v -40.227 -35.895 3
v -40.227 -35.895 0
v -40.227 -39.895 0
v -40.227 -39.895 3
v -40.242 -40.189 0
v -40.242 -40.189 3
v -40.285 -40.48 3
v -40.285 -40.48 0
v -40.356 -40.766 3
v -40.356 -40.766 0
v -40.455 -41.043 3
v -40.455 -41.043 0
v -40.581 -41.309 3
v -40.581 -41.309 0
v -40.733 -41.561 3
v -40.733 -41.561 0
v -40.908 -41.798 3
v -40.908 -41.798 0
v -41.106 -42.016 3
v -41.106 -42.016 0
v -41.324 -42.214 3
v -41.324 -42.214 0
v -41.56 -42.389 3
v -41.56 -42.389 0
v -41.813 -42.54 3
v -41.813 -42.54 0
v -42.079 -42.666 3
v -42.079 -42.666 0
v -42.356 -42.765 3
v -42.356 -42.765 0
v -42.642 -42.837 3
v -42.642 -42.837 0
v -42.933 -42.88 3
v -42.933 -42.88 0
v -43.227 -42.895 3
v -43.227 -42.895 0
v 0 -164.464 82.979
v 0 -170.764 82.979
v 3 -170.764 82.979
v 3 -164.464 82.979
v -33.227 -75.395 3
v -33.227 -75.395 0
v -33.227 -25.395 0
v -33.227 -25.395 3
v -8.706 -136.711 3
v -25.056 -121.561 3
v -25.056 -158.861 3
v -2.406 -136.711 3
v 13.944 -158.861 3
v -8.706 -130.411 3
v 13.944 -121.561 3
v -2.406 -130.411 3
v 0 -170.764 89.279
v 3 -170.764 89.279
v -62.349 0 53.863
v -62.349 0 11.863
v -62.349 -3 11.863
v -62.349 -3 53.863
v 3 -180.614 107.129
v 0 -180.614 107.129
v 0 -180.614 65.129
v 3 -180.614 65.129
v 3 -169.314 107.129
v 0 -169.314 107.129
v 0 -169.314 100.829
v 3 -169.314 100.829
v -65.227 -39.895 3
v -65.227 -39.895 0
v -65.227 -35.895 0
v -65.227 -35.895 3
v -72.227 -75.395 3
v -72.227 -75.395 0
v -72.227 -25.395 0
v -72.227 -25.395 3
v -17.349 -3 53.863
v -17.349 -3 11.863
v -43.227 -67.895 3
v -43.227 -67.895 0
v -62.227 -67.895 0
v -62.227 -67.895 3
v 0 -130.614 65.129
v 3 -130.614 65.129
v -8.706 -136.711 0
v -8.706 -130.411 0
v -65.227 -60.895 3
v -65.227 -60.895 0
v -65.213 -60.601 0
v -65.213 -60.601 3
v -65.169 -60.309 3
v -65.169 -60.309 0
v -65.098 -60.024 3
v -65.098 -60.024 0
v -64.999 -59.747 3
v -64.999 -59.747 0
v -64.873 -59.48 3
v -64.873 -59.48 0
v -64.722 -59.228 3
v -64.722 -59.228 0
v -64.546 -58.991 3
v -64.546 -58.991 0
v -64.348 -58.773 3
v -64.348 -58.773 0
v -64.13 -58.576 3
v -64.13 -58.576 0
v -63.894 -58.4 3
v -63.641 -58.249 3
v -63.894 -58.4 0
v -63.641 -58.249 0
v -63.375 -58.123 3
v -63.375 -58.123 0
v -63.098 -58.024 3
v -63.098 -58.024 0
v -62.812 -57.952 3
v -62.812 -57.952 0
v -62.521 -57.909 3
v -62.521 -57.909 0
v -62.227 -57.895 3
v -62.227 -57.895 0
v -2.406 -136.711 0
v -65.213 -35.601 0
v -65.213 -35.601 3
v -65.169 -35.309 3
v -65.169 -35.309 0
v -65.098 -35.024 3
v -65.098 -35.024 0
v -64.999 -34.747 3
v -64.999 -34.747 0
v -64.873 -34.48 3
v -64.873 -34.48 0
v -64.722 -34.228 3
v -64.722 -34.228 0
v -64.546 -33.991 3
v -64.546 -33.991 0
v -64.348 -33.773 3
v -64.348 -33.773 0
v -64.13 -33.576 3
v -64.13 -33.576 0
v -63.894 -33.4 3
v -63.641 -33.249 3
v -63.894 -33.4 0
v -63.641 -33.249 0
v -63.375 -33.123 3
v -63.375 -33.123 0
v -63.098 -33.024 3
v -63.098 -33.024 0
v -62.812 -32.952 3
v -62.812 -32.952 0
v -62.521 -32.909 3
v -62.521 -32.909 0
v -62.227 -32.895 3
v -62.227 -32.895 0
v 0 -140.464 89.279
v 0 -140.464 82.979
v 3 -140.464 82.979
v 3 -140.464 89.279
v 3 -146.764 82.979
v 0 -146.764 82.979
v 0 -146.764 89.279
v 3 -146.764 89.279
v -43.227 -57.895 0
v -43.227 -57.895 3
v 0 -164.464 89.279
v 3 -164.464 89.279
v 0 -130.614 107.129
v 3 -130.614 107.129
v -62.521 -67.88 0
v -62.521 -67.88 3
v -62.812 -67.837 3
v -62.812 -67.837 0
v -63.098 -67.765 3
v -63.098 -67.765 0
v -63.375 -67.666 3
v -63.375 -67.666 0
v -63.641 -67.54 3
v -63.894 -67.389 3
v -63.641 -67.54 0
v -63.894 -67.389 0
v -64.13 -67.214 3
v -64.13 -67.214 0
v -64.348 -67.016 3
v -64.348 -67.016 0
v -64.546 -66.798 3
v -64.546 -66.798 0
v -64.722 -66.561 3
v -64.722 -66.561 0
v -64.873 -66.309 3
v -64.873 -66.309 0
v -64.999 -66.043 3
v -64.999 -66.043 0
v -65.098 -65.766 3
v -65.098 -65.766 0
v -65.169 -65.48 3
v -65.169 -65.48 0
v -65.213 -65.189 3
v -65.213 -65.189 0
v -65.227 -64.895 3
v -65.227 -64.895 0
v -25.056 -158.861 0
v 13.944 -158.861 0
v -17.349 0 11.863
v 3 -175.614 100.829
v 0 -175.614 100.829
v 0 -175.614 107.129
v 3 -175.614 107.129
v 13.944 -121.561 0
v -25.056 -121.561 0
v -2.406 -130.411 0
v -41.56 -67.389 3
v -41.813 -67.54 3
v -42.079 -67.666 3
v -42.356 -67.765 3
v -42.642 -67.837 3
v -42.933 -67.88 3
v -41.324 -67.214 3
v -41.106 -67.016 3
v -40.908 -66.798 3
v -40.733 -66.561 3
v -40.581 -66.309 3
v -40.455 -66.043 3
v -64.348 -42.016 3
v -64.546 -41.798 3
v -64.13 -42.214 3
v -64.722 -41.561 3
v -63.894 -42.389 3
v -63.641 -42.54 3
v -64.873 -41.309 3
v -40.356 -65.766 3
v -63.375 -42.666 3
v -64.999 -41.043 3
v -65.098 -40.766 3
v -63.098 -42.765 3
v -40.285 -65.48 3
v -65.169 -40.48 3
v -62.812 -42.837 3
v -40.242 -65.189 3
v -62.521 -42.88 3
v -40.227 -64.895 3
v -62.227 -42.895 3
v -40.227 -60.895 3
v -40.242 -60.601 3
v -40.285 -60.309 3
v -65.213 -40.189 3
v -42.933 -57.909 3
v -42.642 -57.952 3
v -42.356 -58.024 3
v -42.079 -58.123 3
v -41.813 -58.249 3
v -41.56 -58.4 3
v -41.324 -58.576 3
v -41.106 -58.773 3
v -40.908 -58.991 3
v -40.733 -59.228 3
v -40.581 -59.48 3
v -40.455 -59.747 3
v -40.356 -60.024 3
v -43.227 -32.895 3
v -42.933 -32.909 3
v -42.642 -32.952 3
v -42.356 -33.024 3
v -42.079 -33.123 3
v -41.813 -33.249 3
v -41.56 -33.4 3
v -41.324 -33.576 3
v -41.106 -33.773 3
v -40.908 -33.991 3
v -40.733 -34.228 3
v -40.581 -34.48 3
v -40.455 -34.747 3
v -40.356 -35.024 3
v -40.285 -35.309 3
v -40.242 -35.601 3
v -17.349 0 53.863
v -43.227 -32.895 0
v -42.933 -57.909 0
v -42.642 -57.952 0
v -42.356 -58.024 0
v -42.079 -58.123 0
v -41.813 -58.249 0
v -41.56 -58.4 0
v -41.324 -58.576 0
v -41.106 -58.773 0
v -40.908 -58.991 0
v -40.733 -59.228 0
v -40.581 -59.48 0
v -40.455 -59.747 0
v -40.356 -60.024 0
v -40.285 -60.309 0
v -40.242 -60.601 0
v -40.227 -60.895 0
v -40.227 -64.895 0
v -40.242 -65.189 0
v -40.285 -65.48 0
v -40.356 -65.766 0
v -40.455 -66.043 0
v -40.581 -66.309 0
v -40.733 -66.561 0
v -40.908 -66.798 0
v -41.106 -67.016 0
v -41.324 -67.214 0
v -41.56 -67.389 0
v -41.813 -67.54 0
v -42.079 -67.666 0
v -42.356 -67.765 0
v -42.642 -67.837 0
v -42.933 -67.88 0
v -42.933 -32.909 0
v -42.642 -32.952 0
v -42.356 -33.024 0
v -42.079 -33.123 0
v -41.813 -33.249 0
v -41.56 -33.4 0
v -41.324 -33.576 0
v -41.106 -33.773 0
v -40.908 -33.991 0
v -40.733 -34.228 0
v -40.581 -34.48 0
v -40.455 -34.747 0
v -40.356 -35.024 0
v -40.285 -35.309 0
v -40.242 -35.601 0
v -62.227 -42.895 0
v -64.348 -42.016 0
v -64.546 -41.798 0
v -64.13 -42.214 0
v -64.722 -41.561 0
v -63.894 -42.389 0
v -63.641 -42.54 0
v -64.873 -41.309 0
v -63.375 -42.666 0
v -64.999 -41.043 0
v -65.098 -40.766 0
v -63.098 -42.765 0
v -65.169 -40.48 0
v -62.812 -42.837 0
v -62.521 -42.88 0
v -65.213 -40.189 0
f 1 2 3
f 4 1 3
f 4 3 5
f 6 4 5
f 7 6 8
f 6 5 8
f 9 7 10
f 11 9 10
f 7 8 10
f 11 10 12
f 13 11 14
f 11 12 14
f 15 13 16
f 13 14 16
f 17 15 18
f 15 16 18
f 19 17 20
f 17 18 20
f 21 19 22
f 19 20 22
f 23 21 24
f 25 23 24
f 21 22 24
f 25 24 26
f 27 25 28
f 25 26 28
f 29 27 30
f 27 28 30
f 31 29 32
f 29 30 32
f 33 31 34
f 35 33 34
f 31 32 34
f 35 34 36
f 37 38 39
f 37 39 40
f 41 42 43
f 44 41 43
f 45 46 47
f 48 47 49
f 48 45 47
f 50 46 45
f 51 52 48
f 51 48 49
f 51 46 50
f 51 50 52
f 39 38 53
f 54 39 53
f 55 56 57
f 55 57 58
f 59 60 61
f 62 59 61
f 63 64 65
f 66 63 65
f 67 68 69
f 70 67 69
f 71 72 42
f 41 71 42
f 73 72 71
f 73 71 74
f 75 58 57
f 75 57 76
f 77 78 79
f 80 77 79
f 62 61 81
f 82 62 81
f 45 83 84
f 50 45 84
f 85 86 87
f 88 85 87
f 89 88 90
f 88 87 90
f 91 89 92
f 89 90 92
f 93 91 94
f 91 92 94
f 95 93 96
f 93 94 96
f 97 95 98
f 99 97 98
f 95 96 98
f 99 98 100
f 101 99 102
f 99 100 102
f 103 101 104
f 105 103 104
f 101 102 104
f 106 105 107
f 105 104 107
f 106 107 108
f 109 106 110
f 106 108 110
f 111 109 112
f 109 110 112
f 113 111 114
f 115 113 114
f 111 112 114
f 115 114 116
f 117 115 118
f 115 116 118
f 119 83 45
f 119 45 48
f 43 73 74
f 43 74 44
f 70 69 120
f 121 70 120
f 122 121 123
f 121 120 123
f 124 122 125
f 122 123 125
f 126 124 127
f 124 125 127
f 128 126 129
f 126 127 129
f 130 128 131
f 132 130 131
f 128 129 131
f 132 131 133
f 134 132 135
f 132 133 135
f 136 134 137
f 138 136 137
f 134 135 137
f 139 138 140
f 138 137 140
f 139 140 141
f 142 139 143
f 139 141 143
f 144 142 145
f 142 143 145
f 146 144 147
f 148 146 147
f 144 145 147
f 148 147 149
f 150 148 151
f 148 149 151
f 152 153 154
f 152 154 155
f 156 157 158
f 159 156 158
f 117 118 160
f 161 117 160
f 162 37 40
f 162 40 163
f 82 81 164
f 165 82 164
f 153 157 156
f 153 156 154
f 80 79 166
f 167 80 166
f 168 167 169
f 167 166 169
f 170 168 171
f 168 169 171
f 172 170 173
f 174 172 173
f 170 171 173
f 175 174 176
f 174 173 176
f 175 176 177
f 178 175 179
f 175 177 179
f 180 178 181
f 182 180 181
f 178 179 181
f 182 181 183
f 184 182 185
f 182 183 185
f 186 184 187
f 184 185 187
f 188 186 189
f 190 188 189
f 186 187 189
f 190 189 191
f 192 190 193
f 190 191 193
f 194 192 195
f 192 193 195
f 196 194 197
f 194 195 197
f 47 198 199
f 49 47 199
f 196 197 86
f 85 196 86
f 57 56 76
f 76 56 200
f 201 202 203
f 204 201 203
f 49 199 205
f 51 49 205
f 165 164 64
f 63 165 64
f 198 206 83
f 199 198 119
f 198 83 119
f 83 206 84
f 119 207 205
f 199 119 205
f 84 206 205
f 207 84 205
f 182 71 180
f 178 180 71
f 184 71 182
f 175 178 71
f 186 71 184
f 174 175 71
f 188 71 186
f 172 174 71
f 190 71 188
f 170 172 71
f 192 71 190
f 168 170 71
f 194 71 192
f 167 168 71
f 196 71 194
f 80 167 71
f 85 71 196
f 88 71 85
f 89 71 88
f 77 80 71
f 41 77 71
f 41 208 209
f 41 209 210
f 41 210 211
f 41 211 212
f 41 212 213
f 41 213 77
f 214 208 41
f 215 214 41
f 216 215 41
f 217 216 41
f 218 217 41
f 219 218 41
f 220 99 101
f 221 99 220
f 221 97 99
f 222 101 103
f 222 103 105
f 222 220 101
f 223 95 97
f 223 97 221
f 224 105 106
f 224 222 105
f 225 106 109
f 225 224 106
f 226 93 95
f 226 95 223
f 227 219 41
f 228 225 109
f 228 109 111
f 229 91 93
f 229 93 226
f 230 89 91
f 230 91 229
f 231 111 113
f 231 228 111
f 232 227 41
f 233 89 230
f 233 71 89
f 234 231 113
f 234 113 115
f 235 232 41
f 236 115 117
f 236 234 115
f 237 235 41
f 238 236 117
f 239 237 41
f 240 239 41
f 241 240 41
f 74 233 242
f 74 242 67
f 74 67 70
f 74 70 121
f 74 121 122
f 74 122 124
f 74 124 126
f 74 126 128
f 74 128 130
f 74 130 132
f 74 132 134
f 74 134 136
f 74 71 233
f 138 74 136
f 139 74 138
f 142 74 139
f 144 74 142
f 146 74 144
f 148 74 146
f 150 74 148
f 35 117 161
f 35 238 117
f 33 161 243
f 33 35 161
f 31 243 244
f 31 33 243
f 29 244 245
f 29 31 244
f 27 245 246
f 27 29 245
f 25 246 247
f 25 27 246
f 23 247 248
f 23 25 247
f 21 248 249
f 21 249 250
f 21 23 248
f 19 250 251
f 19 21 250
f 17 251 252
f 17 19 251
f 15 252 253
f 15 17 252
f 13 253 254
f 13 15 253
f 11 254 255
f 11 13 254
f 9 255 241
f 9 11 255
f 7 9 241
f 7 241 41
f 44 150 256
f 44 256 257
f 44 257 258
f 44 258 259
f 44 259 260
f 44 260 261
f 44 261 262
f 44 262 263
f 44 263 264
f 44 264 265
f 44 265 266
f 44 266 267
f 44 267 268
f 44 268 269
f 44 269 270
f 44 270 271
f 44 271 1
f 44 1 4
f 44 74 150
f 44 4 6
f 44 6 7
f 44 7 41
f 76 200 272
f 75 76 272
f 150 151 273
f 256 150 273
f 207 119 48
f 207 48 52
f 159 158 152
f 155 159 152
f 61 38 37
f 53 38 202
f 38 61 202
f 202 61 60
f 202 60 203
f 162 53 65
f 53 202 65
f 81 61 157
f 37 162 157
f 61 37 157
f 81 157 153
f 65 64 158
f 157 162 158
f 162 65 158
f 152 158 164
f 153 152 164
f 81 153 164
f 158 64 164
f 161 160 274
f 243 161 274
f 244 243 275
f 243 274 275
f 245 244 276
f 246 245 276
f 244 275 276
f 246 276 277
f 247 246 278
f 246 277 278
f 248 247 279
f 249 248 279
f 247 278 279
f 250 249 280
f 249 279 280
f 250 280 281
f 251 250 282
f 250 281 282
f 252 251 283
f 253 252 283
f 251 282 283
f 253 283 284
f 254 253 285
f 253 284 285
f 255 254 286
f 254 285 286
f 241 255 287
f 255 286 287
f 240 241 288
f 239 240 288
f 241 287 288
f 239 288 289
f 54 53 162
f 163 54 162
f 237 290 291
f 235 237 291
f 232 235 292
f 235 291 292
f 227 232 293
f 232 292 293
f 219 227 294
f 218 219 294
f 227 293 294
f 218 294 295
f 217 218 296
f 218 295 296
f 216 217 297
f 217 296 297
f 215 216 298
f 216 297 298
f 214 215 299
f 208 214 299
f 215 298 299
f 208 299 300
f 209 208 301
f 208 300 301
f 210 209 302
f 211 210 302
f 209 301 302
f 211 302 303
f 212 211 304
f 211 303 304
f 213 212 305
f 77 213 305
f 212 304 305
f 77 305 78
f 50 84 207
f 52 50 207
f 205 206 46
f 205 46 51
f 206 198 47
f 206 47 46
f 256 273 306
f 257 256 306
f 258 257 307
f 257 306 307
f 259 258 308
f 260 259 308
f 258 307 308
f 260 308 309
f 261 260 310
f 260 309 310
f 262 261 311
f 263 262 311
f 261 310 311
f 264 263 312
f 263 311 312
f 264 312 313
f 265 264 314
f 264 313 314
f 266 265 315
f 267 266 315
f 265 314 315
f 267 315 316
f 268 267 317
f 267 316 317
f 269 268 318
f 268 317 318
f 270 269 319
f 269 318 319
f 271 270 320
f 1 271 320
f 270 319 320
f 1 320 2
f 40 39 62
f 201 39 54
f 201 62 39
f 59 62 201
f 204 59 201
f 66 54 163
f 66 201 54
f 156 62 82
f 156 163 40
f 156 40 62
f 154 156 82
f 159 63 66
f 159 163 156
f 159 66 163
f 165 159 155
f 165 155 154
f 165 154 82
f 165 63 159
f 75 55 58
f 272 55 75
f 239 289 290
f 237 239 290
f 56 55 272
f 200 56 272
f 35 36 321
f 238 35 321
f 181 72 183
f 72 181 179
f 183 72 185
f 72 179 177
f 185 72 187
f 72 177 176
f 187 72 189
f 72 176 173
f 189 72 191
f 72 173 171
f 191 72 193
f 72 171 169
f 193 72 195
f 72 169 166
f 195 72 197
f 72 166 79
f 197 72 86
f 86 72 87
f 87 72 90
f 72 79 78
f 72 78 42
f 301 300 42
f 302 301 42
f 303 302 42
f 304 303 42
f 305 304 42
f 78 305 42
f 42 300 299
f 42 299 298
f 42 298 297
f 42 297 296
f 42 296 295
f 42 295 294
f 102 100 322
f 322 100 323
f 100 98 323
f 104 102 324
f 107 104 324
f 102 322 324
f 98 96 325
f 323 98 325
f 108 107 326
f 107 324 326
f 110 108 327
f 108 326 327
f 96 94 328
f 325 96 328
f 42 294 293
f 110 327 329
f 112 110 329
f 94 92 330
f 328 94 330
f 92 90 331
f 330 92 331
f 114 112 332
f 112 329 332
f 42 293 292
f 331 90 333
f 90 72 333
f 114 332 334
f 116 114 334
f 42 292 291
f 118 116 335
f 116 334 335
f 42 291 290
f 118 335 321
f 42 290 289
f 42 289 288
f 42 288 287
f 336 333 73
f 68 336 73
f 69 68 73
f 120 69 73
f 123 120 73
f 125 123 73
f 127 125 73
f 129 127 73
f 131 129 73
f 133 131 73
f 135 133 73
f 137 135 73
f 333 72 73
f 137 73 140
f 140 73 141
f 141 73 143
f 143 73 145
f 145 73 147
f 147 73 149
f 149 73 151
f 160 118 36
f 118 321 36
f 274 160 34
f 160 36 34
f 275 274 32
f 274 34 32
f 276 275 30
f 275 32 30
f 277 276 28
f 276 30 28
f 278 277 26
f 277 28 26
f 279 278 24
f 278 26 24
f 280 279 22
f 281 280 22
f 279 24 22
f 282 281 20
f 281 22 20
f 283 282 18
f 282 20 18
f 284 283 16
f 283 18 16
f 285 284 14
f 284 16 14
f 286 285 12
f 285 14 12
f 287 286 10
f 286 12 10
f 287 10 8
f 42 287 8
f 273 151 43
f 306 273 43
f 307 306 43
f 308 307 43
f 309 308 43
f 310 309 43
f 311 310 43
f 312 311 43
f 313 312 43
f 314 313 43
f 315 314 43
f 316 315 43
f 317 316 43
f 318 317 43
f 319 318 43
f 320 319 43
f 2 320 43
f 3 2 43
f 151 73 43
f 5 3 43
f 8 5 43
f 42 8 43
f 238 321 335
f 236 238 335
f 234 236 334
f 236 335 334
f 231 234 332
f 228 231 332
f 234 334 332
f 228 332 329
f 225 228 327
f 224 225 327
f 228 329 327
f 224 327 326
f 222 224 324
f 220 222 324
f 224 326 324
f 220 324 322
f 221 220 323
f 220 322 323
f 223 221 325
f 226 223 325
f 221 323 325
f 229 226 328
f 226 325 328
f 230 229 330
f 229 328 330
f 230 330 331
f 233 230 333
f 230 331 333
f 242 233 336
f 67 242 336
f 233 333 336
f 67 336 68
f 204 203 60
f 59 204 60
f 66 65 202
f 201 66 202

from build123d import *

# Parameters (mm, degrees)
F0_W     = 39
F0_H     = 37.3
F0_W_2   = 6.3
F0_H_2   = 6.3
F1_DEPTH = 3
F2_W     = 6.3
F2_H     = 6.3
F3_DEPTH = 3
F4_W     = 39
F4_H     = 50
F5_DEPTH = 3
F6_W     = 45
F6_H     = 42
F7_DEPTH = 3


with BuildPart() as f1:
    # F0 (on Top) → F1 (new body)
    with BuildSketch(Plane.XY):
        with Locations((-5.556118, -140.21081)):
            Rectangle(F0_W, F0_H)
        with Locations((-5.556118, -133.56081)):
            Rectangle(F0_W_2, F0_H_2, mode=Mode.SUBTRACT)
    extrude(amount=F1_DEPTH)


with BuildPart() as f3:
    # F2 (on Right) → F3 (new body)
    with BuildSketch(Plane.YZ):
        Polygon((-180.614469, 65.129462), (-130.614469, 65.129462), (-130.614469, 107.129462), (-169.314469, 107.129462), (-169.314469, 100.829462), (-175.614469, 100.829462), (-175.614469, 107.129462), (-180.614469, 107.129462), align=None)
        with Locations((-167.614469, 86.129462)):
            Rectangle(F2_W, F2_H, mode=Mode.SUBTRACT)
        with Locations((-143.614469, 86.129462)):
            Rectangle(F2_W, F2_H, mode=Mode.SUBTRACT)
    extrude(amount=F3_DEPTH)


with BuildPart() as f5:
    # F4 (on Top) → F5 (new body)
    with BuildSketch(Plane.XY):
        with Locations((-52.727118, -50.394673)):
            Rectangle(F4_W, F4_H)
        with BuildLine():
            ThreePointArc((-65.227118, -60.894673), (-64.348439, -58.773353), (-62.227118, -57.894673))
            Line((-62.227118, -57.894673), (-43.227118, -57.894673))
            ThreePointArc((-43.227118, -57.894673), (-41.105798, -58.773353), (-40.227118, -60.894673))
            Line((-40.227118, -60.894673), (-40.227118, -64.894673))
            ThreePointArc((-40.227118, -64.894673), (-41.105798, -67.015994), (-43.227118, -67.894673))
            Line((-43.227118, -67.894673), (-62.227118, -67.894673))
            ThreePointArc((-62.227118, -67.894673), (-64.348439, -67.015994), (-65.227118, -64.894673))
            Line((-65.227118, -64.894673), (-65.227118, -60.894673))
        make_face(mode=Mode.SUBTRACT)
        with BuildLine():
            Line((-43.227118, -42.894673), (-62.227118, -42.894673))
            ThreePointArc((-62.227118, -42.894673), (-64.348439, -42.015994), (-65.227118, -39.894673))
            Line((-65.227118, -39.894673), (-65.227118, -35.894673))
            ThreePointArc((-65.227118, -35.894673), (-64.348439, -33.773353), (-62.227118, -32.894673))
            Line((-62.227118, -32.894673), (-43.227118, -32.894673))
            ThreePointArc((-43.227118, -32.894673), (-41.105798, -33.773353), (-40.227118, -35.894673))
            Line((-40.227118, -35.894673), (-40.227118, -39.894673))
            ThreePointArc((-40.227118, -39.894673), (-41.105798, -42.015994), (-43.227118, -42.894673))
        make_face(mode=Mode.SUBTRACT)
    extrude(amount=F5_DEPTH)


with BuildPart() as f7:
    # F6 (on Front) → F7 (new body)
    with BuildSketch(Plane.XZ):
        with Locations((-39.849168, 32.863347)):
            Rectangle(F6_W, F6_H)
    extrude(amount=F7_DEPTH)


solid = Compound([f1.part, f3.part, f5.part, f7.part])
